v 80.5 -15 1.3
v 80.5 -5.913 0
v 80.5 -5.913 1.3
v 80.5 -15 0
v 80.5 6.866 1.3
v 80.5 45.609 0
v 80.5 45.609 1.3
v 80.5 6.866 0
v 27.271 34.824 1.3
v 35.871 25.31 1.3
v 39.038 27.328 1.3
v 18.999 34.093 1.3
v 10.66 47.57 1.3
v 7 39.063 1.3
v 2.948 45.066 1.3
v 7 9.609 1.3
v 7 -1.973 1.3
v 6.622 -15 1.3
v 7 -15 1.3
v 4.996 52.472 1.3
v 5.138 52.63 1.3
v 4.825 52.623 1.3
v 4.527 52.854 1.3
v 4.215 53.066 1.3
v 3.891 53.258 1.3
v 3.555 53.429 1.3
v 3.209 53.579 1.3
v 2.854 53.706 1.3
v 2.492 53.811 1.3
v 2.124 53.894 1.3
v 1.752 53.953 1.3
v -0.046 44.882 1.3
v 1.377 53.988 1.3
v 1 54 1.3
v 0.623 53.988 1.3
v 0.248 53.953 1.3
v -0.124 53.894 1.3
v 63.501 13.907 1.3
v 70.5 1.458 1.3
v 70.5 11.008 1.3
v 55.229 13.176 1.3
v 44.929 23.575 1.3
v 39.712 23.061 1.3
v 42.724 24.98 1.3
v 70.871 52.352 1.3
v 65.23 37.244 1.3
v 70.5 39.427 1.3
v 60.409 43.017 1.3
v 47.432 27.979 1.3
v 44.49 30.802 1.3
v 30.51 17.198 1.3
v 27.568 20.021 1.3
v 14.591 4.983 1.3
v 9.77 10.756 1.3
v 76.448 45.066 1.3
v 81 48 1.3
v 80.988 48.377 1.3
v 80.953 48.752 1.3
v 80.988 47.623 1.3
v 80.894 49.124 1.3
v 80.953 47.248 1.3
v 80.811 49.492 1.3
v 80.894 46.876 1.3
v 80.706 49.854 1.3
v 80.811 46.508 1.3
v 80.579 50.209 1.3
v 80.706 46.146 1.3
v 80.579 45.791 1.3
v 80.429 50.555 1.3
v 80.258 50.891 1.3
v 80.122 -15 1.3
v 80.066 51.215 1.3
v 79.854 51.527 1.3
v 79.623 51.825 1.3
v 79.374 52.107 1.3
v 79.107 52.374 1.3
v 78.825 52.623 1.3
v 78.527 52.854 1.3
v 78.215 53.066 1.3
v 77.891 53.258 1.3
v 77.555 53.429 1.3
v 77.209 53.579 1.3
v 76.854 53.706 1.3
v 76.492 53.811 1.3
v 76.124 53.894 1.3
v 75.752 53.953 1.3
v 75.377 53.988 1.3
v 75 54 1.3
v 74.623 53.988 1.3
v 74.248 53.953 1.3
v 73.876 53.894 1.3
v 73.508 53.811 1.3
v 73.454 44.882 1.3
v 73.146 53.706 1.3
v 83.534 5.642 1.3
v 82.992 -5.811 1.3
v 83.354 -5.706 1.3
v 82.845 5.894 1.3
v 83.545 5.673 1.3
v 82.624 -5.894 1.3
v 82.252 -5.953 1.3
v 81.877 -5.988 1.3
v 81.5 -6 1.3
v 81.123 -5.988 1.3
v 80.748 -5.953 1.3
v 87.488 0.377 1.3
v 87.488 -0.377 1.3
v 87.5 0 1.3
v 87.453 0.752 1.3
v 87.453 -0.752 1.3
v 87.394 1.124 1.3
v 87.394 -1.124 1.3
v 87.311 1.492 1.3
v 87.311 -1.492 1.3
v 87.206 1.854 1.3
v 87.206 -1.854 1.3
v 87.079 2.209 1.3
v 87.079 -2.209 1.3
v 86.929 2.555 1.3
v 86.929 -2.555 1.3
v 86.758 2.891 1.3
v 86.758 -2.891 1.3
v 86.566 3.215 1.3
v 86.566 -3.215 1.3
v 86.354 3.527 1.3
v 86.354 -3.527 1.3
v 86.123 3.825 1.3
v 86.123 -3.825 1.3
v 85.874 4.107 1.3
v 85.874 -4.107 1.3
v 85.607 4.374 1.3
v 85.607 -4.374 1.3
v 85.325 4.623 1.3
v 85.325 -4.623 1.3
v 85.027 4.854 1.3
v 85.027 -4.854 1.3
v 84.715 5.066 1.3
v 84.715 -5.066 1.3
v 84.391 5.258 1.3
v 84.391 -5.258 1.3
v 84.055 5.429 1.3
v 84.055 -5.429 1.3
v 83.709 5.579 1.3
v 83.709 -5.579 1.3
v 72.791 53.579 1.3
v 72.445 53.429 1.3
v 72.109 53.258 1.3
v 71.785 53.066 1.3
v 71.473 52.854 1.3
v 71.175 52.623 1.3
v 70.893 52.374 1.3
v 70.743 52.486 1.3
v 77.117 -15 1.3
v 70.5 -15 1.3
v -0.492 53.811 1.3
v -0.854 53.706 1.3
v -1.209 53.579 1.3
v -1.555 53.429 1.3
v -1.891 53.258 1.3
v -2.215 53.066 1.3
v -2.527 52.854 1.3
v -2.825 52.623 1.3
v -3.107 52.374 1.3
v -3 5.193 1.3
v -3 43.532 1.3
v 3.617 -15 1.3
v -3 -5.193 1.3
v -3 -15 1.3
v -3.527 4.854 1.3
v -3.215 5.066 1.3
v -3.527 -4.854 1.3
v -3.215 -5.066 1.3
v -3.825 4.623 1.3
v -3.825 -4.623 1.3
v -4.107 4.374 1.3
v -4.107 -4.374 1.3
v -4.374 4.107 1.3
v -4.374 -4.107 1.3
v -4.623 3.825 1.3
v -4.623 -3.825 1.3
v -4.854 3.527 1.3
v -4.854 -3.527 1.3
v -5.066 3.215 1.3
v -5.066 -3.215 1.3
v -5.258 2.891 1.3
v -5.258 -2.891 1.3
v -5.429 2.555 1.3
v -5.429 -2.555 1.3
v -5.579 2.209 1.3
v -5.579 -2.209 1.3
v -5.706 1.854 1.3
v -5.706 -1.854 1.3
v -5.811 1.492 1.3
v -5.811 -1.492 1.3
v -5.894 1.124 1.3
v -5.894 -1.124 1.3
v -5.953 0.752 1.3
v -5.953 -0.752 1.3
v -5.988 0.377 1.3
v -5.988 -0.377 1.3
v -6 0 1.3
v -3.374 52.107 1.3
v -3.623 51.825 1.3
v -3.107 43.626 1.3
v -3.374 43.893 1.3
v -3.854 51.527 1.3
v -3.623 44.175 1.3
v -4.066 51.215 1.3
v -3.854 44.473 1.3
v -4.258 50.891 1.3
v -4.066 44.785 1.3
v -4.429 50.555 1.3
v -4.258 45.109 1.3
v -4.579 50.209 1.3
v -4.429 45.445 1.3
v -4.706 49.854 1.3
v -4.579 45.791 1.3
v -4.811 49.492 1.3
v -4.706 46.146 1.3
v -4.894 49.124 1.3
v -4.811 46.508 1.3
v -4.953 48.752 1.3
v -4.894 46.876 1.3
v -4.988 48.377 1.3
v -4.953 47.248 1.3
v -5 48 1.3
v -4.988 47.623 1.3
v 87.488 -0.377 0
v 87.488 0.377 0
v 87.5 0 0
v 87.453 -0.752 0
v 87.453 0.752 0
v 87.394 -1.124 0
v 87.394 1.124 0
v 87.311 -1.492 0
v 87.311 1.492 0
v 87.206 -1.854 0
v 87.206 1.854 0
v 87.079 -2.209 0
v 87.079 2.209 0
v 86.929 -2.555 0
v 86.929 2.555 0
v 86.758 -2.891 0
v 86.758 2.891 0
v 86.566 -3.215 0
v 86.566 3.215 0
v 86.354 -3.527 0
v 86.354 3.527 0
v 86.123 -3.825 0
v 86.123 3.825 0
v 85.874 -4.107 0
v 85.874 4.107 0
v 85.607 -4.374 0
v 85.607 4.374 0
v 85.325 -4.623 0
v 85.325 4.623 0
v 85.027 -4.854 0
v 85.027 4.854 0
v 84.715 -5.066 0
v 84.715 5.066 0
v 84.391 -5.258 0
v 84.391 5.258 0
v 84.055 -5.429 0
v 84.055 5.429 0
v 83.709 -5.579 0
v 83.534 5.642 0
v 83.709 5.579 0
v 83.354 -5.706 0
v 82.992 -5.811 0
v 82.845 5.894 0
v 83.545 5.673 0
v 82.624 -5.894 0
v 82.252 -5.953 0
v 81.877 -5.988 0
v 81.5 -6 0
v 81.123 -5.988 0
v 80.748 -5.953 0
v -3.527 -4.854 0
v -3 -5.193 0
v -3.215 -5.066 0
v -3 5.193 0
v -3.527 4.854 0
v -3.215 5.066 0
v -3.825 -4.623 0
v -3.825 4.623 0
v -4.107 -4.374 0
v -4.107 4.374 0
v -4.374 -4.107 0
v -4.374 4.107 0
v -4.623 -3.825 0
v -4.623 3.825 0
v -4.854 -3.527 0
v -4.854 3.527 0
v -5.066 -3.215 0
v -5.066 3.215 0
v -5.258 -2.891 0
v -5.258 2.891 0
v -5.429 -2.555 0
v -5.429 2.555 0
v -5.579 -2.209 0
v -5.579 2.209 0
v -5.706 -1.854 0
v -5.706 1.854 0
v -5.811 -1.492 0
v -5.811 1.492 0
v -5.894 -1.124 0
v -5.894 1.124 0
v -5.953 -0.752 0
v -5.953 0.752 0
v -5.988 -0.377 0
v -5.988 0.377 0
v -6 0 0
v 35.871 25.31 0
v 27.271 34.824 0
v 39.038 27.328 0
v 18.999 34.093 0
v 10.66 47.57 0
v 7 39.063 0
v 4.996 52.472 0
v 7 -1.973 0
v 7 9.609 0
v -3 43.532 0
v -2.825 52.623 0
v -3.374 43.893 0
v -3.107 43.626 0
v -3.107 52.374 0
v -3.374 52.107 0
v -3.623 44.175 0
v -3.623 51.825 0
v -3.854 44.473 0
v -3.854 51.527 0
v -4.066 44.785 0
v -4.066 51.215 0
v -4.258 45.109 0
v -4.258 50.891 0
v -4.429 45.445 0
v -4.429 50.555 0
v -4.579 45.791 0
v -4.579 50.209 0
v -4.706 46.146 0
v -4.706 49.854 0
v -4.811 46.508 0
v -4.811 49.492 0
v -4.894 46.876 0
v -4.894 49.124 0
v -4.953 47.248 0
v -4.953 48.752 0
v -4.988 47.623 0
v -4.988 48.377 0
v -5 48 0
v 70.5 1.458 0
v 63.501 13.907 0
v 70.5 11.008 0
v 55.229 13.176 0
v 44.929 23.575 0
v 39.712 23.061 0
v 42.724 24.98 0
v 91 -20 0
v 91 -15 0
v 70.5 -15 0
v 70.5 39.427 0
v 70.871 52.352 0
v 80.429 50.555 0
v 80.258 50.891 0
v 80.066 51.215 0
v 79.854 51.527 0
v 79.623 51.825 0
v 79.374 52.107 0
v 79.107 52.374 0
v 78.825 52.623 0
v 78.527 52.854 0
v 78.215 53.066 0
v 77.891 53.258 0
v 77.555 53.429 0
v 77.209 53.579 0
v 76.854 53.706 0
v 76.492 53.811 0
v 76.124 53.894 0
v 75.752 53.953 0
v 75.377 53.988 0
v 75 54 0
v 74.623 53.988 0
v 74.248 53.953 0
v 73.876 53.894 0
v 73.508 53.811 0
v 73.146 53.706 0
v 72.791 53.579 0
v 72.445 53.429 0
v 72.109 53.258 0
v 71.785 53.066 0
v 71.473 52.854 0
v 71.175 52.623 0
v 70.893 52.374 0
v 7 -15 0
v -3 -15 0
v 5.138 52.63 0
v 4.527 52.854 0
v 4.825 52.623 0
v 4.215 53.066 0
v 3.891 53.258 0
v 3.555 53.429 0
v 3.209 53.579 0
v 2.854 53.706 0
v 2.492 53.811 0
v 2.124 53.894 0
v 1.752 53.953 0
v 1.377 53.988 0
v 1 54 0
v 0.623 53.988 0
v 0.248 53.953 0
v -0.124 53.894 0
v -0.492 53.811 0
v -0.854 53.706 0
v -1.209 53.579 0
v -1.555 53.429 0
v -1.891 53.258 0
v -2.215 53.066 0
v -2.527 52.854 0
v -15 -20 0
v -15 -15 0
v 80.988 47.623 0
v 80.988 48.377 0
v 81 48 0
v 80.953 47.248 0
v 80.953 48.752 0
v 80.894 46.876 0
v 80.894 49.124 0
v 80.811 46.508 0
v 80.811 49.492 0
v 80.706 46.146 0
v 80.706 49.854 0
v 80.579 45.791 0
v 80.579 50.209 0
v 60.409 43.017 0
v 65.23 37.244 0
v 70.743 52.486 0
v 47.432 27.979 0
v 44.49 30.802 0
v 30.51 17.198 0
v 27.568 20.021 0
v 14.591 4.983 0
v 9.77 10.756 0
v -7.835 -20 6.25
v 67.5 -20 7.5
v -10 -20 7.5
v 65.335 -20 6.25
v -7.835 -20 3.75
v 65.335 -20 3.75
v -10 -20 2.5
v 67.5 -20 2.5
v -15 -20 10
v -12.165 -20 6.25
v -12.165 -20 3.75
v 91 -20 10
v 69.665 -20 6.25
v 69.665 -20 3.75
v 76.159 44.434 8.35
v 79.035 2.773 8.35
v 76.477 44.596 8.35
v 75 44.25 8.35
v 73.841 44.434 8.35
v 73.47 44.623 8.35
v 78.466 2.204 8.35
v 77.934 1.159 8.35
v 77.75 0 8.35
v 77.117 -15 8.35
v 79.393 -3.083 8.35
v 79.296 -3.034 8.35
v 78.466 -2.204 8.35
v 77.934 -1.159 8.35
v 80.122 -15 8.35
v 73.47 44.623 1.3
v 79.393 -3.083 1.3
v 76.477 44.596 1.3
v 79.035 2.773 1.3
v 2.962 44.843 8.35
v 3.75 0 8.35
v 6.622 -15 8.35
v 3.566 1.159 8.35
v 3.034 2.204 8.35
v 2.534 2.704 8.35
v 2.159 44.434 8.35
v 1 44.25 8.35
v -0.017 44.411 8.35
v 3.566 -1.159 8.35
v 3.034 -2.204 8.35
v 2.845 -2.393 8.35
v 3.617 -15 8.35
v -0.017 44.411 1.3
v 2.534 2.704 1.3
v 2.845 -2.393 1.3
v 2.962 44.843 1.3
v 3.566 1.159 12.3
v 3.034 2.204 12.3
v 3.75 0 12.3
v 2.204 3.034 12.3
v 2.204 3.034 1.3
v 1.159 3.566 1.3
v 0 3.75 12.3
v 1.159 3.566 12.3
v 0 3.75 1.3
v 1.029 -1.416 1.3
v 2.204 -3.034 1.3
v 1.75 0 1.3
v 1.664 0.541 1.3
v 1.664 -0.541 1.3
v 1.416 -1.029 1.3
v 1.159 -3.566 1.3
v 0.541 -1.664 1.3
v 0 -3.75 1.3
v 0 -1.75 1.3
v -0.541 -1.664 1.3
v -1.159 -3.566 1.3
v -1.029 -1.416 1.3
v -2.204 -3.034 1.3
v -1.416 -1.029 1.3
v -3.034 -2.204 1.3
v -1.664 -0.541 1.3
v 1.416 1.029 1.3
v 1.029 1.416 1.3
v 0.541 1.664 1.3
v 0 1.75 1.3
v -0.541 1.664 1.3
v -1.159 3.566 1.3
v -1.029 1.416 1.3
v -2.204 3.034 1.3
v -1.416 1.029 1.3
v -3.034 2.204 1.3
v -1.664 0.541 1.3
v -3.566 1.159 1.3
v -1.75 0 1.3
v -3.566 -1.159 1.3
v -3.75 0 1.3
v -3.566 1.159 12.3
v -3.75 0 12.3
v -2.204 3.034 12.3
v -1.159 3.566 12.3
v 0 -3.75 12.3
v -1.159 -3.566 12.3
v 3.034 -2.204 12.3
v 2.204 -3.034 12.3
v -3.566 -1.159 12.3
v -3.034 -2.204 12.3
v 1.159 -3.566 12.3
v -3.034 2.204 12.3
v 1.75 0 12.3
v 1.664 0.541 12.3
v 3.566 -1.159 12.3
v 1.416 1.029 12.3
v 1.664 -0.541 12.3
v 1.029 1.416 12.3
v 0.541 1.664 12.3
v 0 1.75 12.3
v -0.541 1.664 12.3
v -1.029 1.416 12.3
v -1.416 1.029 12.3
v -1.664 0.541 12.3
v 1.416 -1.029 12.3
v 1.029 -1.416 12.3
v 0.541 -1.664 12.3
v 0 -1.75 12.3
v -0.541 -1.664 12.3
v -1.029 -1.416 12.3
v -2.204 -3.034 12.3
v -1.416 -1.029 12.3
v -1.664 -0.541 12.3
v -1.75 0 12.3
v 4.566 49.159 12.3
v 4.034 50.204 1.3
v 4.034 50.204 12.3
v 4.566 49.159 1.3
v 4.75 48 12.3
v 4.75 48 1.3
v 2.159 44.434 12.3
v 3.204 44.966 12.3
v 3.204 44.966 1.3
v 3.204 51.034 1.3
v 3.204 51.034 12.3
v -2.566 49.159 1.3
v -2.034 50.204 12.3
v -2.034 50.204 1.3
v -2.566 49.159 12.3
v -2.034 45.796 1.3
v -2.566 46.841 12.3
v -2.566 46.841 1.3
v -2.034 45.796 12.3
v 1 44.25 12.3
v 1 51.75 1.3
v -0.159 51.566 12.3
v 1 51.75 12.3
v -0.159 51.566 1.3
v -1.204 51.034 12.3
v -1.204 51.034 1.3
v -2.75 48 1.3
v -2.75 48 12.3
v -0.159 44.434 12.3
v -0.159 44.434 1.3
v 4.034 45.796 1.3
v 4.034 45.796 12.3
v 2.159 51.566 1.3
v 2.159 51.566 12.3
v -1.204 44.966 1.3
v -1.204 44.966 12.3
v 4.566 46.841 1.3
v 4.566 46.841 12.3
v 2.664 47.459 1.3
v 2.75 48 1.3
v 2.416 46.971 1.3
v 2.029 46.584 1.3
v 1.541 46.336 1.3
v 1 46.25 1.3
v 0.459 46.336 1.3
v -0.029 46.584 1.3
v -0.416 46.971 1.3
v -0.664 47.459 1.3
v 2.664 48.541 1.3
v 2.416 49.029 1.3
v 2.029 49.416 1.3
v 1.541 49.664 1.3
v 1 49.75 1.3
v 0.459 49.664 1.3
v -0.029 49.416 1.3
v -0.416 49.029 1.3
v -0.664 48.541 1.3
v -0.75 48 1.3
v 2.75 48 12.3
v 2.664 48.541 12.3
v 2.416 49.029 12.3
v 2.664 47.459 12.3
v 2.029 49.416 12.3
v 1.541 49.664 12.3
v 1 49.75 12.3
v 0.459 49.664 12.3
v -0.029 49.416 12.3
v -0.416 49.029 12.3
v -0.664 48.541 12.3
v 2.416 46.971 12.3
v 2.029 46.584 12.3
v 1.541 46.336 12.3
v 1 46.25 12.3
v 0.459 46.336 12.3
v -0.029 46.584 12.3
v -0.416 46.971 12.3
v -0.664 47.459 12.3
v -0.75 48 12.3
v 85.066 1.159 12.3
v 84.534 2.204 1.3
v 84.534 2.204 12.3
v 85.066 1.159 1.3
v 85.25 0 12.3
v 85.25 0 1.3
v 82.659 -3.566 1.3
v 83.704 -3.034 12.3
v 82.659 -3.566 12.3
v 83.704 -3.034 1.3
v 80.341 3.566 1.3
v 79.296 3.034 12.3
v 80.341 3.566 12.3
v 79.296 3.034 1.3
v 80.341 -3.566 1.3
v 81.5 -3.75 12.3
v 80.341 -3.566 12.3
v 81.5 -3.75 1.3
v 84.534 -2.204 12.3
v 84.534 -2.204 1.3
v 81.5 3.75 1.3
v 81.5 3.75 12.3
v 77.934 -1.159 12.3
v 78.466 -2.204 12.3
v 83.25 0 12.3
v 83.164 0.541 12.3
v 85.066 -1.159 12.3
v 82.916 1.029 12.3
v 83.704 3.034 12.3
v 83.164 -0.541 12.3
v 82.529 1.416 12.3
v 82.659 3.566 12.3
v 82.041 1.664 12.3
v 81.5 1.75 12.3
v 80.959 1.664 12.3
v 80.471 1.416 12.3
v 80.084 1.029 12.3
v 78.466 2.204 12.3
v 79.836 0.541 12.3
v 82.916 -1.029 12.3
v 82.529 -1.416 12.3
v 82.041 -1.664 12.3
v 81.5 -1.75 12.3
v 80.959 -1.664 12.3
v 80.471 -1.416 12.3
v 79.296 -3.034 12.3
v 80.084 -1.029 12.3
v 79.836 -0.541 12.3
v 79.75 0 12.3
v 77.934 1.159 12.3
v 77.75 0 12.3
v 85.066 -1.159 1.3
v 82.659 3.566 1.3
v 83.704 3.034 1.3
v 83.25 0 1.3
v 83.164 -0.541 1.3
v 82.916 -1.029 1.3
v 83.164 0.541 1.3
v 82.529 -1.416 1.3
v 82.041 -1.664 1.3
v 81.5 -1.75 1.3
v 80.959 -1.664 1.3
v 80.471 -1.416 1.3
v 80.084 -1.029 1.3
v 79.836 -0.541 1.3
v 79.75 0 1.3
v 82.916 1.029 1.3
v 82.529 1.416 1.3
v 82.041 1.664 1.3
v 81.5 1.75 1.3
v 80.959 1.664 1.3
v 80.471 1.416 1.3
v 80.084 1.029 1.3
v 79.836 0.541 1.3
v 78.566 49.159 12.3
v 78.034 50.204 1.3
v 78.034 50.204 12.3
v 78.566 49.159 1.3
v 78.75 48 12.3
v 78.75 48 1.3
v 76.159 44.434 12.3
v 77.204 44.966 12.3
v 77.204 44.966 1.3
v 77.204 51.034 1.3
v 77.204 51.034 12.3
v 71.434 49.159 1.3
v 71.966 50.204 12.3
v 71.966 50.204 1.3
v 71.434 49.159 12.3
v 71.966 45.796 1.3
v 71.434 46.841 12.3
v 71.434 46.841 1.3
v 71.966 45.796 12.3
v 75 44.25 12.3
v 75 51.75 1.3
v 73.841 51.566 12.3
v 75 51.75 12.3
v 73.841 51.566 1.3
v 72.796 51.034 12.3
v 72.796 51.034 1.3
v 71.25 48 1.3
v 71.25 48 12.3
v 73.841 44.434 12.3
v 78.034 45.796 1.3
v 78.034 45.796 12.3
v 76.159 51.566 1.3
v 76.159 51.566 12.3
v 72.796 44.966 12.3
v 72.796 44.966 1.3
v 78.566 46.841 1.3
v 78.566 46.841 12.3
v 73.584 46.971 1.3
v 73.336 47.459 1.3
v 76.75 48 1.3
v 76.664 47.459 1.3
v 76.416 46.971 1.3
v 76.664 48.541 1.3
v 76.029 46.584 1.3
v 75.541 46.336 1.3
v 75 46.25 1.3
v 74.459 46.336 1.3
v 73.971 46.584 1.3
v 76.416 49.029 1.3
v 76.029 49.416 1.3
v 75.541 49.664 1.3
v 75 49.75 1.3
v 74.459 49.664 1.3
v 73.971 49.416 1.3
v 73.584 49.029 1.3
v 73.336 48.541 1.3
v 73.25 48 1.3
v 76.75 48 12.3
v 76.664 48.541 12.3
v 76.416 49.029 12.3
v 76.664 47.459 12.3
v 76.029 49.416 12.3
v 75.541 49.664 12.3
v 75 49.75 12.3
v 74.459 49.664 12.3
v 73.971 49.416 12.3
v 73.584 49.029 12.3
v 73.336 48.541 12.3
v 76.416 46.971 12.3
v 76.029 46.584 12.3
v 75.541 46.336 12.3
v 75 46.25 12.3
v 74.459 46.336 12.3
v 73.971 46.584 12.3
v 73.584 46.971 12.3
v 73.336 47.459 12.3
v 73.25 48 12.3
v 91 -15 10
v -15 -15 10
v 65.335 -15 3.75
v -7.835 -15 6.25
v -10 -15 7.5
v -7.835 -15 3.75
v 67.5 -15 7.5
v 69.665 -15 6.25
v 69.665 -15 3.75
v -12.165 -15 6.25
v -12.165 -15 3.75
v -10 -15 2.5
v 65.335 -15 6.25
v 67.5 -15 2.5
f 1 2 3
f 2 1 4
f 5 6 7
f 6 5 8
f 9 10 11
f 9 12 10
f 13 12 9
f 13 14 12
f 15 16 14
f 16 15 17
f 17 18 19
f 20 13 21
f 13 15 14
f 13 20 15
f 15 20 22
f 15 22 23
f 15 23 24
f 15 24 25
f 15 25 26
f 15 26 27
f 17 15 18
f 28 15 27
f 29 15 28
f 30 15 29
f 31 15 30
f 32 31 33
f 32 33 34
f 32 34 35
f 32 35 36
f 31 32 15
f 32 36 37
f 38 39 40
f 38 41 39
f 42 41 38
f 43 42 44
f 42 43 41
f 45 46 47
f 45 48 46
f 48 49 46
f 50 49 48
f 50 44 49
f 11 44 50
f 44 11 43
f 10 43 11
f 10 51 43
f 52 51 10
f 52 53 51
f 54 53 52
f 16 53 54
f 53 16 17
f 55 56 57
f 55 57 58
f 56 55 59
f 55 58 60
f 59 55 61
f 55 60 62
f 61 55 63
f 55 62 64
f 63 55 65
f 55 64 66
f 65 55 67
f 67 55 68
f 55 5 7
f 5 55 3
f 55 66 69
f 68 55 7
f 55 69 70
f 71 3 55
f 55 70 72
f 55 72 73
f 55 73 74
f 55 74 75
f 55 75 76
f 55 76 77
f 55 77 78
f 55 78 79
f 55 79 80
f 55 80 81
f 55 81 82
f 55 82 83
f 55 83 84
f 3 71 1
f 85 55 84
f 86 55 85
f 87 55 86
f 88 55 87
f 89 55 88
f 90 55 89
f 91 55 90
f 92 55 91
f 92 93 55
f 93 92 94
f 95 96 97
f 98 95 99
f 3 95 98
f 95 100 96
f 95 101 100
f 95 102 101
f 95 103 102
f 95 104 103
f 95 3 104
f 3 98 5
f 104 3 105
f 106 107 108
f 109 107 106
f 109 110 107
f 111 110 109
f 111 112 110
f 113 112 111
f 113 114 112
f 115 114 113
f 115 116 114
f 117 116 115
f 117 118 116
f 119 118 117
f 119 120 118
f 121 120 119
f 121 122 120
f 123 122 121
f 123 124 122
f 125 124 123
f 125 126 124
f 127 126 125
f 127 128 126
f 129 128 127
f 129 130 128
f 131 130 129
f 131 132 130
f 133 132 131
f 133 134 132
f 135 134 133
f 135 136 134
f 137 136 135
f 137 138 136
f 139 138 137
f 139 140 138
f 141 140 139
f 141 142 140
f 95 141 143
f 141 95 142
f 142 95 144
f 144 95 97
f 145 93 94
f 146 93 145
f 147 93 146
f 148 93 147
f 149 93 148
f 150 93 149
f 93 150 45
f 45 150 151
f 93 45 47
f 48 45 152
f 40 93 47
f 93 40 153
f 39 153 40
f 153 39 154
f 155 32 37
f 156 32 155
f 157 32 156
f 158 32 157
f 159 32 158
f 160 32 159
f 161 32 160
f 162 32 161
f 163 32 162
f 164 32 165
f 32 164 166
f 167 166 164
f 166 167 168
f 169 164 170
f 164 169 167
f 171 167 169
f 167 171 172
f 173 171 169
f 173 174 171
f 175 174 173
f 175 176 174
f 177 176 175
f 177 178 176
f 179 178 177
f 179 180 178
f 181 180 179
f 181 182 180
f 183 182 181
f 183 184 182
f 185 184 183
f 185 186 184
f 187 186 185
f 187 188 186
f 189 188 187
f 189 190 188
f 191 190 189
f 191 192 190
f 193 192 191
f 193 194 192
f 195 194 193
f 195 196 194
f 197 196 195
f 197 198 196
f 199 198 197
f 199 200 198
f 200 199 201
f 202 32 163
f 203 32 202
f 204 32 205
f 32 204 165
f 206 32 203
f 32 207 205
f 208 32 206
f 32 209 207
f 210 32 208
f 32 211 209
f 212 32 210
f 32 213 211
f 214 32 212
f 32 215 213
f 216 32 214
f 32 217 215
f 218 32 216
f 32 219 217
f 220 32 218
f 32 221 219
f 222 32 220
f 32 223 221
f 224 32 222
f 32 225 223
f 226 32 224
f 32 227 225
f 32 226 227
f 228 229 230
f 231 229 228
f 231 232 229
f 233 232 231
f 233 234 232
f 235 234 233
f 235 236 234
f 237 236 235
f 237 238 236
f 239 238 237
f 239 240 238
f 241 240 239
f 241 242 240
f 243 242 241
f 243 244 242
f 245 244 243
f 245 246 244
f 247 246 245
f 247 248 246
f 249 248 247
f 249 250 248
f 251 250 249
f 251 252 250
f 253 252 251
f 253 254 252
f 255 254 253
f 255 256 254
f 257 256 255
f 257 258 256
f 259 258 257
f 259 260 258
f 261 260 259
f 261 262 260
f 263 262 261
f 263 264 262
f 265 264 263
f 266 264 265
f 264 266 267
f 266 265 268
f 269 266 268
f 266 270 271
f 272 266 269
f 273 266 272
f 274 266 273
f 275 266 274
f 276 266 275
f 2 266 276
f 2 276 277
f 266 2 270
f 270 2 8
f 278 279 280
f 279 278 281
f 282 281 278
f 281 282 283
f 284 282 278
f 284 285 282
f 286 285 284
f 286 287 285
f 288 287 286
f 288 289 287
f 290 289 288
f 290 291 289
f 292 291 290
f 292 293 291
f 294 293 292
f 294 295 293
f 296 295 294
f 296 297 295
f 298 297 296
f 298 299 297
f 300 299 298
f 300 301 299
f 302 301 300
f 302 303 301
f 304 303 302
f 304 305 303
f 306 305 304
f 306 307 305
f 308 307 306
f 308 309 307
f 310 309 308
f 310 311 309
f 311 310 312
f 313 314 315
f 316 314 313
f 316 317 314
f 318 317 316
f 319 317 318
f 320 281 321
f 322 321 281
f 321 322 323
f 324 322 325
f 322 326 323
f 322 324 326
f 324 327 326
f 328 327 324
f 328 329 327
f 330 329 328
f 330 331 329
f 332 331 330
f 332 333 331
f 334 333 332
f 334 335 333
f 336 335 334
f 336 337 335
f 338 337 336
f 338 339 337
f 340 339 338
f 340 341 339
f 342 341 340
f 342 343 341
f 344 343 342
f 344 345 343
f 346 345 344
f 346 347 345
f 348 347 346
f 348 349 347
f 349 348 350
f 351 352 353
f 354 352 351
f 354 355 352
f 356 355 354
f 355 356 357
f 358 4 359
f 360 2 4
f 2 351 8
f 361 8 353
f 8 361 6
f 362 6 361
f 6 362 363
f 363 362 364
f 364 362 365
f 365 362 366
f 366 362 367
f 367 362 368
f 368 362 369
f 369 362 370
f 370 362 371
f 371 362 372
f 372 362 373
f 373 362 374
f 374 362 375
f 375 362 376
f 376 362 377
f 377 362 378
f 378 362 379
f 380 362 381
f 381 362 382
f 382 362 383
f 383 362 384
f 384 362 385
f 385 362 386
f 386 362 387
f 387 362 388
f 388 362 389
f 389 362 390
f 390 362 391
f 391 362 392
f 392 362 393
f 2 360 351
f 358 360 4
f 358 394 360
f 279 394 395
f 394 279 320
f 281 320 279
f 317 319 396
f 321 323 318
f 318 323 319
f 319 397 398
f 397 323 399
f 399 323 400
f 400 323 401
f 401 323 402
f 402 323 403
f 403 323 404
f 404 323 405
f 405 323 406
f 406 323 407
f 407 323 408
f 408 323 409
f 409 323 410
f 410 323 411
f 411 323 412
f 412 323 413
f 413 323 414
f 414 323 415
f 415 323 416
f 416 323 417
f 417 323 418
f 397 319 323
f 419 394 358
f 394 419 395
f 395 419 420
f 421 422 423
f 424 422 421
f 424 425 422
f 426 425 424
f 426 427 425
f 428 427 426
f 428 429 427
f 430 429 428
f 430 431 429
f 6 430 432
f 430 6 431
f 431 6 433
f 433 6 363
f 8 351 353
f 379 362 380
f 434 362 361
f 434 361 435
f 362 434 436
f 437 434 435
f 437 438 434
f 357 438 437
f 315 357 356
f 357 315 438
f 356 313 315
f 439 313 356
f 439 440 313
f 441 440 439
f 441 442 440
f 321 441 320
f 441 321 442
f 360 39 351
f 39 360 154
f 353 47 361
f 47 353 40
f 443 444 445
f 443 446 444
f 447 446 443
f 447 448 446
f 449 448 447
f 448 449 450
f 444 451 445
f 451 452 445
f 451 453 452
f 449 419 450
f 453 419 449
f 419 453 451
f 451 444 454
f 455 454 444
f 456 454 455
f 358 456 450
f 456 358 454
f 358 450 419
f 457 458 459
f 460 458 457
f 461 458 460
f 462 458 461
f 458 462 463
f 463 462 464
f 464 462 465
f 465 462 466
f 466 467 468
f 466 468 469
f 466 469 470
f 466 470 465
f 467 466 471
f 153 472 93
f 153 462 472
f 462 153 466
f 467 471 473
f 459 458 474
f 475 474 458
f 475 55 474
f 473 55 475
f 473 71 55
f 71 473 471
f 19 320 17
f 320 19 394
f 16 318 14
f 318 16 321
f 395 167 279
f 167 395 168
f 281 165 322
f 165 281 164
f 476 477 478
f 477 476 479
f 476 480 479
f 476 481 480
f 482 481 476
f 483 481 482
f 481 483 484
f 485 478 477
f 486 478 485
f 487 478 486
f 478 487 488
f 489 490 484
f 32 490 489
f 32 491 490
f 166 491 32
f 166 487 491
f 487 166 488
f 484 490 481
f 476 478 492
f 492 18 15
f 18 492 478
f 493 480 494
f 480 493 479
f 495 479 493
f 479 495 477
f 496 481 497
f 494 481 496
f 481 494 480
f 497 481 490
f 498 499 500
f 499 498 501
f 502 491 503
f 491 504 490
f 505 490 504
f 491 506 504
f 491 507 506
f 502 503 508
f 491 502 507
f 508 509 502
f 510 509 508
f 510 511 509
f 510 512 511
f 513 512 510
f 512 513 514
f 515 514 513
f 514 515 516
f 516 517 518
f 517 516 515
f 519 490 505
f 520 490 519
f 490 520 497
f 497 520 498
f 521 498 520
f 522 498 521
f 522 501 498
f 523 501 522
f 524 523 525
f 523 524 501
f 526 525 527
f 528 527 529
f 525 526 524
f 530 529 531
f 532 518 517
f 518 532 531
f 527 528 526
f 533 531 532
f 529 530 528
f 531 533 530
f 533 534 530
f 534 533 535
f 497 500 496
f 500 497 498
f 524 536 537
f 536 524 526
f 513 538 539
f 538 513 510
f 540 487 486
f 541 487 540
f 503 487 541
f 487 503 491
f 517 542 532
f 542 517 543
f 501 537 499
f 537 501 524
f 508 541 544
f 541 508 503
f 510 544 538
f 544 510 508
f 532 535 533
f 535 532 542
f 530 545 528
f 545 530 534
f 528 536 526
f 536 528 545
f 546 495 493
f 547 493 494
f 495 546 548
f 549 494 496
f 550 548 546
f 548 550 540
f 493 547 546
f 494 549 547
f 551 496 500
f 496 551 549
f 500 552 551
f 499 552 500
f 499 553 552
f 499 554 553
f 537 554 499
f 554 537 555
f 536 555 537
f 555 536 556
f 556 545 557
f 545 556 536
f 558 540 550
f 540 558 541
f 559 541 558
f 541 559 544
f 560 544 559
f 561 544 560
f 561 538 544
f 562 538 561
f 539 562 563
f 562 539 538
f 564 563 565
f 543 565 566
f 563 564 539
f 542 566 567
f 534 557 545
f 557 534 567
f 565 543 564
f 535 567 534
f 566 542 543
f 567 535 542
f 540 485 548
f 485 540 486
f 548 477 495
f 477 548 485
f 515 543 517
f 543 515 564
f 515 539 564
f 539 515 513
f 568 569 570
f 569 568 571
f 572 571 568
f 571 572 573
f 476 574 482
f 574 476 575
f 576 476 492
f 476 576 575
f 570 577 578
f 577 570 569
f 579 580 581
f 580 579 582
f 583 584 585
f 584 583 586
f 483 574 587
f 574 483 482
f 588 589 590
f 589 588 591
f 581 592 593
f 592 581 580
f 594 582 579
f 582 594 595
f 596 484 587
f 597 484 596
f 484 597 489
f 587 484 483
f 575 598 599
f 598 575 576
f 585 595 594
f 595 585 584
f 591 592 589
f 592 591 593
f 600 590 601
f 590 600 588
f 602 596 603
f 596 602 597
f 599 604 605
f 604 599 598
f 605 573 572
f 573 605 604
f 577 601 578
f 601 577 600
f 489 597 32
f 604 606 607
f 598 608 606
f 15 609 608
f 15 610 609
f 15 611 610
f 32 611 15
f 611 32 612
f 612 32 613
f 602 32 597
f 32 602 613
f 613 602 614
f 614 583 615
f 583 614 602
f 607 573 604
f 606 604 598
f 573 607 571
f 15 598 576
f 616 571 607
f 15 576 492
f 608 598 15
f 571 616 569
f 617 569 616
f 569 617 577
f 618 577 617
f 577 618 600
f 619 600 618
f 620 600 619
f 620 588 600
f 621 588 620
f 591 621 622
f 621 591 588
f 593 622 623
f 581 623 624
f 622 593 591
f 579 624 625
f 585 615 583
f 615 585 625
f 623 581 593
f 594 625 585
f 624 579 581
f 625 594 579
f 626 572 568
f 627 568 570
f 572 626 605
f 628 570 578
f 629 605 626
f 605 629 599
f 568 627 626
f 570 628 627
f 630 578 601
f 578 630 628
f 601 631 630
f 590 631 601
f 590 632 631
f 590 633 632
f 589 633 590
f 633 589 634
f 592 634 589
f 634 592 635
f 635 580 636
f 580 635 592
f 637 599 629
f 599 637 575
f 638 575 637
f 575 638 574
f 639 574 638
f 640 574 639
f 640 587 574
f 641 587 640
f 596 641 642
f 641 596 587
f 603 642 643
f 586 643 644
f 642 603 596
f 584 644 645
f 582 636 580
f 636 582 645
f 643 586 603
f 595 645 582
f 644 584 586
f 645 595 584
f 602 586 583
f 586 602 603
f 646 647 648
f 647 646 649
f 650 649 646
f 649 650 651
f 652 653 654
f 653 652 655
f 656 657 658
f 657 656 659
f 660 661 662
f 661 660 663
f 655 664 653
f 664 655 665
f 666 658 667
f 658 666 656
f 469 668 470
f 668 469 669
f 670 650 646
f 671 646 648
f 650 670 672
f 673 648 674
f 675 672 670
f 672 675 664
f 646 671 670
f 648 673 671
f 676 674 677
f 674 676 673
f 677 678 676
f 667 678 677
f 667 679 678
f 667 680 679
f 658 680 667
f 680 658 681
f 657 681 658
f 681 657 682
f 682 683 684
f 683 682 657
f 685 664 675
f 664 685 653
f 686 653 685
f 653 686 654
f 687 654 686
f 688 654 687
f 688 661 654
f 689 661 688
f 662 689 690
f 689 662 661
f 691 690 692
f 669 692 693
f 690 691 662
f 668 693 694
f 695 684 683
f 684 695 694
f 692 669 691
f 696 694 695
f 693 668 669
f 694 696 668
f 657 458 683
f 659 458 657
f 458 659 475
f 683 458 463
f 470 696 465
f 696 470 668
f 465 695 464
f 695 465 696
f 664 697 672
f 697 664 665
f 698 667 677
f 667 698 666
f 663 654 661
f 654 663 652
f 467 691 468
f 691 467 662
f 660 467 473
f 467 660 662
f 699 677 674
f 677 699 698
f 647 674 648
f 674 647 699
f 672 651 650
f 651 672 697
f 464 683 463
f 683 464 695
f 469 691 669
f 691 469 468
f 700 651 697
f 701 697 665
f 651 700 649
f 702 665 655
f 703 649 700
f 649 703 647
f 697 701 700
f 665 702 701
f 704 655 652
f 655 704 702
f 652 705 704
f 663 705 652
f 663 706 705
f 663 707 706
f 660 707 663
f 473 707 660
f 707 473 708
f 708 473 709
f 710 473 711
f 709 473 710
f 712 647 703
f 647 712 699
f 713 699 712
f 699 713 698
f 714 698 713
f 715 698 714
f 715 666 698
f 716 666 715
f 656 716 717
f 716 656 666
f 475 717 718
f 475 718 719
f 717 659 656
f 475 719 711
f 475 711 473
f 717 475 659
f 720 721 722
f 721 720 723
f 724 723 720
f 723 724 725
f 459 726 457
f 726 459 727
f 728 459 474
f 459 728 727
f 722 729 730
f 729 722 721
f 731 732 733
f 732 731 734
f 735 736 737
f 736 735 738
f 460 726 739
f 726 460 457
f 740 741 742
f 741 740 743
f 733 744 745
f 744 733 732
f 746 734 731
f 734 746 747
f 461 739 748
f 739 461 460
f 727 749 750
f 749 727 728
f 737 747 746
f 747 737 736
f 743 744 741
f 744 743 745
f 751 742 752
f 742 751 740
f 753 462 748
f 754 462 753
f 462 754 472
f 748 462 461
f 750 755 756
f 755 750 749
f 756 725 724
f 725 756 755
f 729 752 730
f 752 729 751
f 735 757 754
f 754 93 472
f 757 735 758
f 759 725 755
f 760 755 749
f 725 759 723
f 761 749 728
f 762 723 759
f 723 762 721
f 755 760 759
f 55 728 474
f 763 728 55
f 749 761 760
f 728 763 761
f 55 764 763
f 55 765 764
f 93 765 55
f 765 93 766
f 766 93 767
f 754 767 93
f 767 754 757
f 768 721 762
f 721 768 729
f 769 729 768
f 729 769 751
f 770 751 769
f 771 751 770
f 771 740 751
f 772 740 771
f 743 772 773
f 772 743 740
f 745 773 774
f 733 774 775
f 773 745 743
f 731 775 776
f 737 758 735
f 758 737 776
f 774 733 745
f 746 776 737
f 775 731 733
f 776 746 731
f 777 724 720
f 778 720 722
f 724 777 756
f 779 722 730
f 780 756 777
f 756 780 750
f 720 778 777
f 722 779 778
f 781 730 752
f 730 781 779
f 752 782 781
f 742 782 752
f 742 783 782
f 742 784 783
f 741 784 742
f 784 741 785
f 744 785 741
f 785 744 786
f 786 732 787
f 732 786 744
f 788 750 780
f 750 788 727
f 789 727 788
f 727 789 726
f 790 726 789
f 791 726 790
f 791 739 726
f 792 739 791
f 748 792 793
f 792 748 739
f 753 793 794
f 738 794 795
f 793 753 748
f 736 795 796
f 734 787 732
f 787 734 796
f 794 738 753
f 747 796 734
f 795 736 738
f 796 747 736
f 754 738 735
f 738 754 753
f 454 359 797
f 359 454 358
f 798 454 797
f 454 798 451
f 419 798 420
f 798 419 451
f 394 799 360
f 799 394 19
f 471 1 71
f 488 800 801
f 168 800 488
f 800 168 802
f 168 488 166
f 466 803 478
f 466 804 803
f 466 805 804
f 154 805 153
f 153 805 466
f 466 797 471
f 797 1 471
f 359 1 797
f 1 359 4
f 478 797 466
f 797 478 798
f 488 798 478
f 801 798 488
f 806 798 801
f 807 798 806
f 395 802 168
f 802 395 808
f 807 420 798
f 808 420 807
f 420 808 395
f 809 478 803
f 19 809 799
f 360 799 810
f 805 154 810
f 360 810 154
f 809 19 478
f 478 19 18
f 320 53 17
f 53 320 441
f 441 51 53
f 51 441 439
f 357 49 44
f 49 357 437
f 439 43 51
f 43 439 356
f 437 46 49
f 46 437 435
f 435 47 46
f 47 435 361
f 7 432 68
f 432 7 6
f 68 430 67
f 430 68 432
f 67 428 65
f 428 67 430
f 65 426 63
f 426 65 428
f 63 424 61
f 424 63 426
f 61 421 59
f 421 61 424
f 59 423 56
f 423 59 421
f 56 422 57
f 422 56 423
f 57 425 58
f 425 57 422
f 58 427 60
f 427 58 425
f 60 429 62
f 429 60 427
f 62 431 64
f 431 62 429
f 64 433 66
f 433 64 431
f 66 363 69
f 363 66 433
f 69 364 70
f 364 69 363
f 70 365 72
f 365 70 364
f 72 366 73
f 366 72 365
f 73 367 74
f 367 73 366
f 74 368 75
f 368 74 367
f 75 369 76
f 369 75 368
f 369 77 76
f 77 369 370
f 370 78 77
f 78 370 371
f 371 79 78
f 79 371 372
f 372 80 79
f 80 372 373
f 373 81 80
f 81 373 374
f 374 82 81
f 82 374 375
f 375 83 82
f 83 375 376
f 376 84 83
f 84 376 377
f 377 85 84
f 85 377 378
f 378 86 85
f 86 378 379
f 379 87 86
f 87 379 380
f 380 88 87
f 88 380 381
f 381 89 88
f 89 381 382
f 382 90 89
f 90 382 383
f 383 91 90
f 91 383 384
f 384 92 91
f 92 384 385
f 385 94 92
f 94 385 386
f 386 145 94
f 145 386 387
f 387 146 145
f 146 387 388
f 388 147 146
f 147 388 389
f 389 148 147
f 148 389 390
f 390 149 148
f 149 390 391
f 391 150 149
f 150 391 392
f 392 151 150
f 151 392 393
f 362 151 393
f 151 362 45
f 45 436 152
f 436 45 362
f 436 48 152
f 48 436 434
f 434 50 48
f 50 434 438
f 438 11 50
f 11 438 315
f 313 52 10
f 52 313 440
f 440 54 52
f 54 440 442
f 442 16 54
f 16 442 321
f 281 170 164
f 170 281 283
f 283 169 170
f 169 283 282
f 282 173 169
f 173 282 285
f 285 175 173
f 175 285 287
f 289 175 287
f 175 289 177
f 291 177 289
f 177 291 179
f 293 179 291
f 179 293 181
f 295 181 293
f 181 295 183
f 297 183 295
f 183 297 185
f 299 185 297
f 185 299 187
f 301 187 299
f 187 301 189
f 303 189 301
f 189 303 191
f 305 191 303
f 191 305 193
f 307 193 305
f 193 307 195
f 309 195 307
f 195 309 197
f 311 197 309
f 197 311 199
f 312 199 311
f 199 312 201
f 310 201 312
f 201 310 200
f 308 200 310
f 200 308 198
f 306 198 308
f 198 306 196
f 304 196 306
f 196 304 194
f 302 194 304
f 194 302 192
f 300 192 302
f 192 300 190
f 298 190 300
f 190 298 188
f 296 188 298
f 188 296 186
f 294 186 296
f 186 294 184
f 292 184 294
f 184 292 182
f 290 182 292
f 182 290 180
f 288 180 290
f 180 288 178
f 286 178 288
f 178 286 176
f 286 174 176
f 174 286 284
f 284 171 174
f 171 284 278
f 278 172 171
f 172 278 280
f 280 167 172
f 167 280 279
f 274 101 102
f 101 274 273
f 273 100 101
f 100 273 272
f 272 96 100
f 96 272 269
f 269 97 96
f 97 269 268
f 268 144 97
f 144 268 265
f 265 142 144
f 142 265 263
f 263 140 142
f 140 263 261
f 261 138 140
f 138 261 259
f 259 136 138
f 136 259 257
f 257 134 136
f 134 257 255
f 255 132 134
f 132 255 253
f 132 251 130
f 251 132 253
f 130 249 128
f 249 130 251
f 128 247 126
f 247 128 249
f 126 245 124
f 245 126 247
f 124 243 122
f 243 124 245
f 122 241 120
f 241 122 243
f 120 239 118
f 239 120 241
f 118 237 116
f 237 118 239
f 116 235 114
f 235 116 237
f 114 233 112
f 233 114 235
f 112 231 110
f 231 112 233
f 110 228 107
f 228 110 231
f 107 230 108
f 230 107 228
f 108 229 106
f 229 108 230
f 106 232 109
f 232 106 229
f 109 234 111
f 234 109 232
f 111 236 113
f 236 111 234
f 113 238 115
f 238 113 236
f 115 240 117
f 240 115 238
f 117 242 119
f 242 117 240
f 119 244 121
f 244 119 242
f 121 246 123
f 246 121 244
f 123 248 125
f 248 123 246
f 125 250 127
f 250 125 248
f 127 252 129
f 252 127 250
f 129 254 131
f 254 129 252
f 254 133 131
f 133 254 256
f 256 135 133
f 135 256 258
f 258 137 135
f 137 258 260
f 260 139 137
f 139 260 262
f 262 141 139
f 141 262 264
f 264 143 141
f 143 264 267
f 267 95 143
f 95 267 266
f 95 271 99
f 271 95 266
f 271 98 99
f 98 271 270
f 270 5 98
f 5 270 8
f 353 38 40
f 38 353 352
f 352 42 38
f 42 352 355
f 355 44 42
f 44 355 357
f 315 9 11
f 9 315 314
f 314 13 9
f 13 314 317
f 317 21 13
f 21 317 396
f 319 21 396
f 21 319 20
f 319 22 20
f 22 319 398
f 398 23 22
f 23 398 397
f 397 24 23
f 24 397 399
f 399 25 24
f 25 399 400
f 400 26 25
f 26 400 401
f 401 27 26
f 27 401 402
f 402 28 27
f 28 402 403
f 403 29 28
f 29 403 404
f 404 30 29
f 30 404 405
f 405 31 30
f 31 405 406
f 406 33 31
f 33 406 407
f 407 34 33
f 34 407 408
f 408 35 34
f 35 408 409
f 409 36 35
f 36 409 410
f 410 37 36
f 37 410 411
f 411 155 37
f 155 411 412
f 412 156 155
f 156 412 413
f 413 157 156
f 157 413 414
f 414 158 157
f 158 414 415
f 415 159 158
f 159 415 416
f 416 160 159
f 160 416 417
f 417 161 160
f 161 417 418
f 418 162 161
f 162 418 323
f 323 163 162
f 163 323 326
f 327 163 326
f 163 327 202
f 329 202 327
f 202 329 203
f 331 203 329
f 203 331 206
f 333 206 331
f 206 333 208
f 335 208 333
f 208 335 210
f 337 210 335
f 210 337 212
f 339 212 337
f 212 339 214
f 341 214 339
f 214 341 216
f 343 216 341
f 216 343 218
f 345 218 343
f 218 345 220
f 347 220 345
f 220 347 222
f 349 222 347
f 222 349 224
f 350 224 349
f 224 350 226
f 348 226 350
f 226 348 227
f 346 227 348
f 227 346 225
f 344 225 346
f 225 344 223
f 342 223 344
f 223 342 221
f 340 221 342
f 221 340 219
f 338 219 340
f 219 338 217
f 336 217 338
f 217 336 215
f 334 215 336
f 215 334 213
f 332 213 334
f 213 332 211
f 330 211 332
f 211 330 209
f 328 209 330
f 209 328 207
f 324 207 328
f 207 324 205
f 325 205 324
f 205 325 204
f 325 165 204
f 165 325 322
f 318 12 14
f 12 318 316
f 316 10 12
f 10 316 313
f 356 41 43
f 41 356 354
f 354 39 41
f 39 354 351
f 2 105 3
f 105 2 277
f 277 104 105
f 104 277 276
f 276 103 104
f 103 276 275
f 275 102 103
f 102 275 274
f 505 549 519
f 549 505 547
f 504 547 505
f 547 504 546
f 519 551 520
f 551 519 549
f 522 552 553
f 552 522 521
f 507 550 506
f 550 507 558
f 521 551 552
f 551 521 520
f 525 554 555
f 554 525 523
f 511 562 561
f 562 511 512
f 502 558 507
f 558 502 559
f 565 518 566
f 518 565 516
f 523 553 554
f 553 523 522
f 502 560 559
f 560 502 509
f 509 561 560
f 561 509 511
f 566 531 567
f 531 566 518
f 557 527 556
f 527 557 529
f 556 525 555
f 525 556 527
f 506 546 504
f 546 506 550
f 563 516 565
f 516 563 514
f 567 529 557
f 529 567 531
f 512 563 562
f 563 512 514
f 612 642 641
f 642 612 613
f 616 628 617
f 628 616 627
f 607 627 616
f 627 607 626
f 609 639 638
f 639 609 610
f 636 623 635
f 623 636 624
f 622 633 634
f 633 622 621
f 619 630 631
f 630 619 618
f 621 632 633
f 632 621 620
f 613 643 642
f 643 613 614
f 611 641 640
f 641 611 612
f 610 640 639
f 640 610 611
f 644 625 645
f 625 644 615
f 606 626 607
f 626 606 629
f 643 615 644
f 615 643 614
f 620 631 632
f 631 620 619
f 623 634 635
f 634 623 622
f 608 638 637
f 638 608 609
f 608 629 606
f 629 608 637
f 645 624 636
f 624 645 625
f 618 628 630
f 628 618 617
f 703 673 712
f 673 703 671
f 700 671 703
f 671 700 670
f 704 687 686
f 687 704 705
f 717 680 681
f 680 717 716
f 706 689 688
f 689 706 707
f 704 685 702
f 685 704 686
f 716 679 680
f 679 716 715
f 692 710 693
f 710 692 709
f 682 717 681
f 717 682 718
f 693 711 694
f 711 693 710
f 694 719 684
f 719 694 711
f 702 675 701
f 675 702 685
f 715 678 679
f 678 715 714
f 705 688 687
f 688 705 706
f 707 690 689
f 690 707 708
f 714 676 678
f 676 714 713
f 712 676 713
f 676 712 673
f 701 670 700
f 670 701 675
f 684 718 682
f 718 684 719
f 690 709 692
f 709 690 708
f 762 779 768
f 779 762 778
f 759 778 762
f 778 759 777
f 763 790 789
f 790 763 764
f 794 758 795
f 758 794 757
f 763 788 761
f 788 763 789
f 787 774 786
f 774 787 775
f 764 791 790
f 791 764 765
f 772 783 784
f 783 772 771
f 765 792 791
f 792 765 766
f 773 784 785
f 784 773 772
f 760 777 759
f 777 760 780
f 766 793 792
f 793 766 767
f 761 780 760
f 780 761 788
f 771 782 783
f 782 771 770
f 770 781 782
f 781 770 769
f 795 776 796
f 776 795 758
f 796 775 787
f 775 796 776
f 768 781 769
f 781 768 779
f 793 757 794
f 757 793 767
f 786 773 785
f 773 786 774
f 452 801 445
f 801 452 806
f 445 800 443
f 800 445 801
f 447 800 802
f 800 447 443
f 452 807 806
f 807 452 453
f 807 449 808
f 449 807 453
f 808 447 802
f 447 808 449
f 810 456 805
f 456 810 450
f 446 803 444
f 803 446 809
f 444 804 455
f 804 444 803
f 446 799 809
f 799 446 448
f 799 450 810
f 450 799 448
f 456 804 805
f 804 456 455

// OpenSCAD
// Based on source openSCAD file from
// http://www.thingiverse.com/thing:14742
//
// Arduino (RAMPS) mount for Prusa / Mendel with accessories holes by 
// MakerCubed is licensed under the 
// Creative Commons - Attribution - Share Alike license.


holes_size = 1.75; // Radius
holes_size_outter = 3.75; // Radius
holes_support = 11;

 
difference(){

	union(){

		// fan mount
		translate([-15,-20,0])
			cube([106, 5, 10]);

		translate([70.5,0,0]) {
			union(){
				translate([0,-20,0]) {
					cube([10,66,1.3]);
				}
				translate([6.8, -18, 0.1])
					rotate([0,0,3.5])
						cube([3,63,holes_support*.75]);
			}
		}
		
		translate([-3,0,0]) {
			translate([0,-20,0]) {
				cube([10,66,1.3]);
			}
			translate([6.8, -18, 0.1])
				rotate([0,0,3.5])
					cube([3,63,holes_support*.75]);
		}
			
		translate([0,0,1.3]) 
			arduino_posts();
		
		linear_extrude(height=1.3)barbell([75,48],[0,0],6,6,230,230);
		linear_extrude(height=1.3)barbell([81.5,0],[1,48],6,6,240,240);
	
	}

	union(){
	
		translate([0,0,1.3]) 
			arduino_holes();
	
	
		translate([-10,-10,5])
			rotate([90,0,0])
				rotate([0,0,30])
					cylinder(r=2.5,h=15, $fn=6);

		translate([67.5,-10,5])
			rotate([90,0,0])
				rotate([0,0,30])
					cylinder(r=2.5,h=15, $fn=6);

	}		

}

// Test

module arduino_holes() {

		// Holes
		//RB
		translate([0,0,0])
			cylinder(r=holes_size,h=holes_support + 0.2, $fn=20);
		//LB
			translate([1,48,0])cylinder(r=holes_size,h=holes_support + 0.2, $fn=20);
		//RT
			translate([81.5,0,0])cylinder(r=holes_size,h=holes_support + 0.2, $fn=20);
		//LT
			translate([75,48,0])cylinder(r=holes_size,h=holes_support + 0.2, $fn=20);

}

module arduino_posts() {

		union() {
			// Outter
			//RB
				cylinder(r=holes_size_outter,h=holes_support, $fn=20);
			//LB
				translate([1,48,0])cylinder(r=holes_size_outter,h=holes_support, $fn=20);
			//RT
				translate([81.5,0,0])cylinder(r=holes_size_outter,h=holes_support, $fn=20);
			//LT
				translate([75,48,0])cylinder(r=holes_size_outter,h=holes_support, $fn=20);
		}

}

//module bar_clamp() {
//
//	translate([0,7,7])rotate([0,90,0])difference() {
//	translate([-3,0,5])cube([20,16,10], true);
//
//	union() {
//		cylinder(10, r=4, $fn=40);
//		translate([-7,0,5])cube([13,7,10], center=true);
//	}
//	// Hole
//		#translate([-8,8,5])rotate([90,0,0])cylinder(16, r=1.5, $fn=20);
//	}
//}


module barbell (x1,x2,r1,r2,r3,r4) 
{
	x3=triangulate (x1,x2,r1+r3,r2+r3);
	x4=triangulate (x2,x1,r2+r4,r1+r4);
	//render()
	difference ()
	{
		union()
		{
			translate(x1)
			circle (r=r1, $fn=100);
			translate(x2)
			circle(r=r2	, $fn=100);
			polygon (points=[x1,x3,x2,x4]);
		}
		translate(x3)
		circle(r=r3,$fa=5);
		translate(x4)
		circle(r=r4,$fa=5);
	}
}

function triangulate (point1, point2, length1, length2) = 
point1 + 
length1*rotated(
atan2(point2[1]-point1[1],point2[0]-point1[0])+
angle(distance(point1,point2),length1,length2));

function distance(point1,point2)=
sqrt((point1[0]-point2[0])*(point1[0]-point2[0])+
(point1[1]-point2[1])*(point1[1]-point2[1]));

function angle(a,b,c) = acos((a*a+b*b-c*c)/(2*a*b)); 

function rotated(a)=[cos(a),sin(a),0];
